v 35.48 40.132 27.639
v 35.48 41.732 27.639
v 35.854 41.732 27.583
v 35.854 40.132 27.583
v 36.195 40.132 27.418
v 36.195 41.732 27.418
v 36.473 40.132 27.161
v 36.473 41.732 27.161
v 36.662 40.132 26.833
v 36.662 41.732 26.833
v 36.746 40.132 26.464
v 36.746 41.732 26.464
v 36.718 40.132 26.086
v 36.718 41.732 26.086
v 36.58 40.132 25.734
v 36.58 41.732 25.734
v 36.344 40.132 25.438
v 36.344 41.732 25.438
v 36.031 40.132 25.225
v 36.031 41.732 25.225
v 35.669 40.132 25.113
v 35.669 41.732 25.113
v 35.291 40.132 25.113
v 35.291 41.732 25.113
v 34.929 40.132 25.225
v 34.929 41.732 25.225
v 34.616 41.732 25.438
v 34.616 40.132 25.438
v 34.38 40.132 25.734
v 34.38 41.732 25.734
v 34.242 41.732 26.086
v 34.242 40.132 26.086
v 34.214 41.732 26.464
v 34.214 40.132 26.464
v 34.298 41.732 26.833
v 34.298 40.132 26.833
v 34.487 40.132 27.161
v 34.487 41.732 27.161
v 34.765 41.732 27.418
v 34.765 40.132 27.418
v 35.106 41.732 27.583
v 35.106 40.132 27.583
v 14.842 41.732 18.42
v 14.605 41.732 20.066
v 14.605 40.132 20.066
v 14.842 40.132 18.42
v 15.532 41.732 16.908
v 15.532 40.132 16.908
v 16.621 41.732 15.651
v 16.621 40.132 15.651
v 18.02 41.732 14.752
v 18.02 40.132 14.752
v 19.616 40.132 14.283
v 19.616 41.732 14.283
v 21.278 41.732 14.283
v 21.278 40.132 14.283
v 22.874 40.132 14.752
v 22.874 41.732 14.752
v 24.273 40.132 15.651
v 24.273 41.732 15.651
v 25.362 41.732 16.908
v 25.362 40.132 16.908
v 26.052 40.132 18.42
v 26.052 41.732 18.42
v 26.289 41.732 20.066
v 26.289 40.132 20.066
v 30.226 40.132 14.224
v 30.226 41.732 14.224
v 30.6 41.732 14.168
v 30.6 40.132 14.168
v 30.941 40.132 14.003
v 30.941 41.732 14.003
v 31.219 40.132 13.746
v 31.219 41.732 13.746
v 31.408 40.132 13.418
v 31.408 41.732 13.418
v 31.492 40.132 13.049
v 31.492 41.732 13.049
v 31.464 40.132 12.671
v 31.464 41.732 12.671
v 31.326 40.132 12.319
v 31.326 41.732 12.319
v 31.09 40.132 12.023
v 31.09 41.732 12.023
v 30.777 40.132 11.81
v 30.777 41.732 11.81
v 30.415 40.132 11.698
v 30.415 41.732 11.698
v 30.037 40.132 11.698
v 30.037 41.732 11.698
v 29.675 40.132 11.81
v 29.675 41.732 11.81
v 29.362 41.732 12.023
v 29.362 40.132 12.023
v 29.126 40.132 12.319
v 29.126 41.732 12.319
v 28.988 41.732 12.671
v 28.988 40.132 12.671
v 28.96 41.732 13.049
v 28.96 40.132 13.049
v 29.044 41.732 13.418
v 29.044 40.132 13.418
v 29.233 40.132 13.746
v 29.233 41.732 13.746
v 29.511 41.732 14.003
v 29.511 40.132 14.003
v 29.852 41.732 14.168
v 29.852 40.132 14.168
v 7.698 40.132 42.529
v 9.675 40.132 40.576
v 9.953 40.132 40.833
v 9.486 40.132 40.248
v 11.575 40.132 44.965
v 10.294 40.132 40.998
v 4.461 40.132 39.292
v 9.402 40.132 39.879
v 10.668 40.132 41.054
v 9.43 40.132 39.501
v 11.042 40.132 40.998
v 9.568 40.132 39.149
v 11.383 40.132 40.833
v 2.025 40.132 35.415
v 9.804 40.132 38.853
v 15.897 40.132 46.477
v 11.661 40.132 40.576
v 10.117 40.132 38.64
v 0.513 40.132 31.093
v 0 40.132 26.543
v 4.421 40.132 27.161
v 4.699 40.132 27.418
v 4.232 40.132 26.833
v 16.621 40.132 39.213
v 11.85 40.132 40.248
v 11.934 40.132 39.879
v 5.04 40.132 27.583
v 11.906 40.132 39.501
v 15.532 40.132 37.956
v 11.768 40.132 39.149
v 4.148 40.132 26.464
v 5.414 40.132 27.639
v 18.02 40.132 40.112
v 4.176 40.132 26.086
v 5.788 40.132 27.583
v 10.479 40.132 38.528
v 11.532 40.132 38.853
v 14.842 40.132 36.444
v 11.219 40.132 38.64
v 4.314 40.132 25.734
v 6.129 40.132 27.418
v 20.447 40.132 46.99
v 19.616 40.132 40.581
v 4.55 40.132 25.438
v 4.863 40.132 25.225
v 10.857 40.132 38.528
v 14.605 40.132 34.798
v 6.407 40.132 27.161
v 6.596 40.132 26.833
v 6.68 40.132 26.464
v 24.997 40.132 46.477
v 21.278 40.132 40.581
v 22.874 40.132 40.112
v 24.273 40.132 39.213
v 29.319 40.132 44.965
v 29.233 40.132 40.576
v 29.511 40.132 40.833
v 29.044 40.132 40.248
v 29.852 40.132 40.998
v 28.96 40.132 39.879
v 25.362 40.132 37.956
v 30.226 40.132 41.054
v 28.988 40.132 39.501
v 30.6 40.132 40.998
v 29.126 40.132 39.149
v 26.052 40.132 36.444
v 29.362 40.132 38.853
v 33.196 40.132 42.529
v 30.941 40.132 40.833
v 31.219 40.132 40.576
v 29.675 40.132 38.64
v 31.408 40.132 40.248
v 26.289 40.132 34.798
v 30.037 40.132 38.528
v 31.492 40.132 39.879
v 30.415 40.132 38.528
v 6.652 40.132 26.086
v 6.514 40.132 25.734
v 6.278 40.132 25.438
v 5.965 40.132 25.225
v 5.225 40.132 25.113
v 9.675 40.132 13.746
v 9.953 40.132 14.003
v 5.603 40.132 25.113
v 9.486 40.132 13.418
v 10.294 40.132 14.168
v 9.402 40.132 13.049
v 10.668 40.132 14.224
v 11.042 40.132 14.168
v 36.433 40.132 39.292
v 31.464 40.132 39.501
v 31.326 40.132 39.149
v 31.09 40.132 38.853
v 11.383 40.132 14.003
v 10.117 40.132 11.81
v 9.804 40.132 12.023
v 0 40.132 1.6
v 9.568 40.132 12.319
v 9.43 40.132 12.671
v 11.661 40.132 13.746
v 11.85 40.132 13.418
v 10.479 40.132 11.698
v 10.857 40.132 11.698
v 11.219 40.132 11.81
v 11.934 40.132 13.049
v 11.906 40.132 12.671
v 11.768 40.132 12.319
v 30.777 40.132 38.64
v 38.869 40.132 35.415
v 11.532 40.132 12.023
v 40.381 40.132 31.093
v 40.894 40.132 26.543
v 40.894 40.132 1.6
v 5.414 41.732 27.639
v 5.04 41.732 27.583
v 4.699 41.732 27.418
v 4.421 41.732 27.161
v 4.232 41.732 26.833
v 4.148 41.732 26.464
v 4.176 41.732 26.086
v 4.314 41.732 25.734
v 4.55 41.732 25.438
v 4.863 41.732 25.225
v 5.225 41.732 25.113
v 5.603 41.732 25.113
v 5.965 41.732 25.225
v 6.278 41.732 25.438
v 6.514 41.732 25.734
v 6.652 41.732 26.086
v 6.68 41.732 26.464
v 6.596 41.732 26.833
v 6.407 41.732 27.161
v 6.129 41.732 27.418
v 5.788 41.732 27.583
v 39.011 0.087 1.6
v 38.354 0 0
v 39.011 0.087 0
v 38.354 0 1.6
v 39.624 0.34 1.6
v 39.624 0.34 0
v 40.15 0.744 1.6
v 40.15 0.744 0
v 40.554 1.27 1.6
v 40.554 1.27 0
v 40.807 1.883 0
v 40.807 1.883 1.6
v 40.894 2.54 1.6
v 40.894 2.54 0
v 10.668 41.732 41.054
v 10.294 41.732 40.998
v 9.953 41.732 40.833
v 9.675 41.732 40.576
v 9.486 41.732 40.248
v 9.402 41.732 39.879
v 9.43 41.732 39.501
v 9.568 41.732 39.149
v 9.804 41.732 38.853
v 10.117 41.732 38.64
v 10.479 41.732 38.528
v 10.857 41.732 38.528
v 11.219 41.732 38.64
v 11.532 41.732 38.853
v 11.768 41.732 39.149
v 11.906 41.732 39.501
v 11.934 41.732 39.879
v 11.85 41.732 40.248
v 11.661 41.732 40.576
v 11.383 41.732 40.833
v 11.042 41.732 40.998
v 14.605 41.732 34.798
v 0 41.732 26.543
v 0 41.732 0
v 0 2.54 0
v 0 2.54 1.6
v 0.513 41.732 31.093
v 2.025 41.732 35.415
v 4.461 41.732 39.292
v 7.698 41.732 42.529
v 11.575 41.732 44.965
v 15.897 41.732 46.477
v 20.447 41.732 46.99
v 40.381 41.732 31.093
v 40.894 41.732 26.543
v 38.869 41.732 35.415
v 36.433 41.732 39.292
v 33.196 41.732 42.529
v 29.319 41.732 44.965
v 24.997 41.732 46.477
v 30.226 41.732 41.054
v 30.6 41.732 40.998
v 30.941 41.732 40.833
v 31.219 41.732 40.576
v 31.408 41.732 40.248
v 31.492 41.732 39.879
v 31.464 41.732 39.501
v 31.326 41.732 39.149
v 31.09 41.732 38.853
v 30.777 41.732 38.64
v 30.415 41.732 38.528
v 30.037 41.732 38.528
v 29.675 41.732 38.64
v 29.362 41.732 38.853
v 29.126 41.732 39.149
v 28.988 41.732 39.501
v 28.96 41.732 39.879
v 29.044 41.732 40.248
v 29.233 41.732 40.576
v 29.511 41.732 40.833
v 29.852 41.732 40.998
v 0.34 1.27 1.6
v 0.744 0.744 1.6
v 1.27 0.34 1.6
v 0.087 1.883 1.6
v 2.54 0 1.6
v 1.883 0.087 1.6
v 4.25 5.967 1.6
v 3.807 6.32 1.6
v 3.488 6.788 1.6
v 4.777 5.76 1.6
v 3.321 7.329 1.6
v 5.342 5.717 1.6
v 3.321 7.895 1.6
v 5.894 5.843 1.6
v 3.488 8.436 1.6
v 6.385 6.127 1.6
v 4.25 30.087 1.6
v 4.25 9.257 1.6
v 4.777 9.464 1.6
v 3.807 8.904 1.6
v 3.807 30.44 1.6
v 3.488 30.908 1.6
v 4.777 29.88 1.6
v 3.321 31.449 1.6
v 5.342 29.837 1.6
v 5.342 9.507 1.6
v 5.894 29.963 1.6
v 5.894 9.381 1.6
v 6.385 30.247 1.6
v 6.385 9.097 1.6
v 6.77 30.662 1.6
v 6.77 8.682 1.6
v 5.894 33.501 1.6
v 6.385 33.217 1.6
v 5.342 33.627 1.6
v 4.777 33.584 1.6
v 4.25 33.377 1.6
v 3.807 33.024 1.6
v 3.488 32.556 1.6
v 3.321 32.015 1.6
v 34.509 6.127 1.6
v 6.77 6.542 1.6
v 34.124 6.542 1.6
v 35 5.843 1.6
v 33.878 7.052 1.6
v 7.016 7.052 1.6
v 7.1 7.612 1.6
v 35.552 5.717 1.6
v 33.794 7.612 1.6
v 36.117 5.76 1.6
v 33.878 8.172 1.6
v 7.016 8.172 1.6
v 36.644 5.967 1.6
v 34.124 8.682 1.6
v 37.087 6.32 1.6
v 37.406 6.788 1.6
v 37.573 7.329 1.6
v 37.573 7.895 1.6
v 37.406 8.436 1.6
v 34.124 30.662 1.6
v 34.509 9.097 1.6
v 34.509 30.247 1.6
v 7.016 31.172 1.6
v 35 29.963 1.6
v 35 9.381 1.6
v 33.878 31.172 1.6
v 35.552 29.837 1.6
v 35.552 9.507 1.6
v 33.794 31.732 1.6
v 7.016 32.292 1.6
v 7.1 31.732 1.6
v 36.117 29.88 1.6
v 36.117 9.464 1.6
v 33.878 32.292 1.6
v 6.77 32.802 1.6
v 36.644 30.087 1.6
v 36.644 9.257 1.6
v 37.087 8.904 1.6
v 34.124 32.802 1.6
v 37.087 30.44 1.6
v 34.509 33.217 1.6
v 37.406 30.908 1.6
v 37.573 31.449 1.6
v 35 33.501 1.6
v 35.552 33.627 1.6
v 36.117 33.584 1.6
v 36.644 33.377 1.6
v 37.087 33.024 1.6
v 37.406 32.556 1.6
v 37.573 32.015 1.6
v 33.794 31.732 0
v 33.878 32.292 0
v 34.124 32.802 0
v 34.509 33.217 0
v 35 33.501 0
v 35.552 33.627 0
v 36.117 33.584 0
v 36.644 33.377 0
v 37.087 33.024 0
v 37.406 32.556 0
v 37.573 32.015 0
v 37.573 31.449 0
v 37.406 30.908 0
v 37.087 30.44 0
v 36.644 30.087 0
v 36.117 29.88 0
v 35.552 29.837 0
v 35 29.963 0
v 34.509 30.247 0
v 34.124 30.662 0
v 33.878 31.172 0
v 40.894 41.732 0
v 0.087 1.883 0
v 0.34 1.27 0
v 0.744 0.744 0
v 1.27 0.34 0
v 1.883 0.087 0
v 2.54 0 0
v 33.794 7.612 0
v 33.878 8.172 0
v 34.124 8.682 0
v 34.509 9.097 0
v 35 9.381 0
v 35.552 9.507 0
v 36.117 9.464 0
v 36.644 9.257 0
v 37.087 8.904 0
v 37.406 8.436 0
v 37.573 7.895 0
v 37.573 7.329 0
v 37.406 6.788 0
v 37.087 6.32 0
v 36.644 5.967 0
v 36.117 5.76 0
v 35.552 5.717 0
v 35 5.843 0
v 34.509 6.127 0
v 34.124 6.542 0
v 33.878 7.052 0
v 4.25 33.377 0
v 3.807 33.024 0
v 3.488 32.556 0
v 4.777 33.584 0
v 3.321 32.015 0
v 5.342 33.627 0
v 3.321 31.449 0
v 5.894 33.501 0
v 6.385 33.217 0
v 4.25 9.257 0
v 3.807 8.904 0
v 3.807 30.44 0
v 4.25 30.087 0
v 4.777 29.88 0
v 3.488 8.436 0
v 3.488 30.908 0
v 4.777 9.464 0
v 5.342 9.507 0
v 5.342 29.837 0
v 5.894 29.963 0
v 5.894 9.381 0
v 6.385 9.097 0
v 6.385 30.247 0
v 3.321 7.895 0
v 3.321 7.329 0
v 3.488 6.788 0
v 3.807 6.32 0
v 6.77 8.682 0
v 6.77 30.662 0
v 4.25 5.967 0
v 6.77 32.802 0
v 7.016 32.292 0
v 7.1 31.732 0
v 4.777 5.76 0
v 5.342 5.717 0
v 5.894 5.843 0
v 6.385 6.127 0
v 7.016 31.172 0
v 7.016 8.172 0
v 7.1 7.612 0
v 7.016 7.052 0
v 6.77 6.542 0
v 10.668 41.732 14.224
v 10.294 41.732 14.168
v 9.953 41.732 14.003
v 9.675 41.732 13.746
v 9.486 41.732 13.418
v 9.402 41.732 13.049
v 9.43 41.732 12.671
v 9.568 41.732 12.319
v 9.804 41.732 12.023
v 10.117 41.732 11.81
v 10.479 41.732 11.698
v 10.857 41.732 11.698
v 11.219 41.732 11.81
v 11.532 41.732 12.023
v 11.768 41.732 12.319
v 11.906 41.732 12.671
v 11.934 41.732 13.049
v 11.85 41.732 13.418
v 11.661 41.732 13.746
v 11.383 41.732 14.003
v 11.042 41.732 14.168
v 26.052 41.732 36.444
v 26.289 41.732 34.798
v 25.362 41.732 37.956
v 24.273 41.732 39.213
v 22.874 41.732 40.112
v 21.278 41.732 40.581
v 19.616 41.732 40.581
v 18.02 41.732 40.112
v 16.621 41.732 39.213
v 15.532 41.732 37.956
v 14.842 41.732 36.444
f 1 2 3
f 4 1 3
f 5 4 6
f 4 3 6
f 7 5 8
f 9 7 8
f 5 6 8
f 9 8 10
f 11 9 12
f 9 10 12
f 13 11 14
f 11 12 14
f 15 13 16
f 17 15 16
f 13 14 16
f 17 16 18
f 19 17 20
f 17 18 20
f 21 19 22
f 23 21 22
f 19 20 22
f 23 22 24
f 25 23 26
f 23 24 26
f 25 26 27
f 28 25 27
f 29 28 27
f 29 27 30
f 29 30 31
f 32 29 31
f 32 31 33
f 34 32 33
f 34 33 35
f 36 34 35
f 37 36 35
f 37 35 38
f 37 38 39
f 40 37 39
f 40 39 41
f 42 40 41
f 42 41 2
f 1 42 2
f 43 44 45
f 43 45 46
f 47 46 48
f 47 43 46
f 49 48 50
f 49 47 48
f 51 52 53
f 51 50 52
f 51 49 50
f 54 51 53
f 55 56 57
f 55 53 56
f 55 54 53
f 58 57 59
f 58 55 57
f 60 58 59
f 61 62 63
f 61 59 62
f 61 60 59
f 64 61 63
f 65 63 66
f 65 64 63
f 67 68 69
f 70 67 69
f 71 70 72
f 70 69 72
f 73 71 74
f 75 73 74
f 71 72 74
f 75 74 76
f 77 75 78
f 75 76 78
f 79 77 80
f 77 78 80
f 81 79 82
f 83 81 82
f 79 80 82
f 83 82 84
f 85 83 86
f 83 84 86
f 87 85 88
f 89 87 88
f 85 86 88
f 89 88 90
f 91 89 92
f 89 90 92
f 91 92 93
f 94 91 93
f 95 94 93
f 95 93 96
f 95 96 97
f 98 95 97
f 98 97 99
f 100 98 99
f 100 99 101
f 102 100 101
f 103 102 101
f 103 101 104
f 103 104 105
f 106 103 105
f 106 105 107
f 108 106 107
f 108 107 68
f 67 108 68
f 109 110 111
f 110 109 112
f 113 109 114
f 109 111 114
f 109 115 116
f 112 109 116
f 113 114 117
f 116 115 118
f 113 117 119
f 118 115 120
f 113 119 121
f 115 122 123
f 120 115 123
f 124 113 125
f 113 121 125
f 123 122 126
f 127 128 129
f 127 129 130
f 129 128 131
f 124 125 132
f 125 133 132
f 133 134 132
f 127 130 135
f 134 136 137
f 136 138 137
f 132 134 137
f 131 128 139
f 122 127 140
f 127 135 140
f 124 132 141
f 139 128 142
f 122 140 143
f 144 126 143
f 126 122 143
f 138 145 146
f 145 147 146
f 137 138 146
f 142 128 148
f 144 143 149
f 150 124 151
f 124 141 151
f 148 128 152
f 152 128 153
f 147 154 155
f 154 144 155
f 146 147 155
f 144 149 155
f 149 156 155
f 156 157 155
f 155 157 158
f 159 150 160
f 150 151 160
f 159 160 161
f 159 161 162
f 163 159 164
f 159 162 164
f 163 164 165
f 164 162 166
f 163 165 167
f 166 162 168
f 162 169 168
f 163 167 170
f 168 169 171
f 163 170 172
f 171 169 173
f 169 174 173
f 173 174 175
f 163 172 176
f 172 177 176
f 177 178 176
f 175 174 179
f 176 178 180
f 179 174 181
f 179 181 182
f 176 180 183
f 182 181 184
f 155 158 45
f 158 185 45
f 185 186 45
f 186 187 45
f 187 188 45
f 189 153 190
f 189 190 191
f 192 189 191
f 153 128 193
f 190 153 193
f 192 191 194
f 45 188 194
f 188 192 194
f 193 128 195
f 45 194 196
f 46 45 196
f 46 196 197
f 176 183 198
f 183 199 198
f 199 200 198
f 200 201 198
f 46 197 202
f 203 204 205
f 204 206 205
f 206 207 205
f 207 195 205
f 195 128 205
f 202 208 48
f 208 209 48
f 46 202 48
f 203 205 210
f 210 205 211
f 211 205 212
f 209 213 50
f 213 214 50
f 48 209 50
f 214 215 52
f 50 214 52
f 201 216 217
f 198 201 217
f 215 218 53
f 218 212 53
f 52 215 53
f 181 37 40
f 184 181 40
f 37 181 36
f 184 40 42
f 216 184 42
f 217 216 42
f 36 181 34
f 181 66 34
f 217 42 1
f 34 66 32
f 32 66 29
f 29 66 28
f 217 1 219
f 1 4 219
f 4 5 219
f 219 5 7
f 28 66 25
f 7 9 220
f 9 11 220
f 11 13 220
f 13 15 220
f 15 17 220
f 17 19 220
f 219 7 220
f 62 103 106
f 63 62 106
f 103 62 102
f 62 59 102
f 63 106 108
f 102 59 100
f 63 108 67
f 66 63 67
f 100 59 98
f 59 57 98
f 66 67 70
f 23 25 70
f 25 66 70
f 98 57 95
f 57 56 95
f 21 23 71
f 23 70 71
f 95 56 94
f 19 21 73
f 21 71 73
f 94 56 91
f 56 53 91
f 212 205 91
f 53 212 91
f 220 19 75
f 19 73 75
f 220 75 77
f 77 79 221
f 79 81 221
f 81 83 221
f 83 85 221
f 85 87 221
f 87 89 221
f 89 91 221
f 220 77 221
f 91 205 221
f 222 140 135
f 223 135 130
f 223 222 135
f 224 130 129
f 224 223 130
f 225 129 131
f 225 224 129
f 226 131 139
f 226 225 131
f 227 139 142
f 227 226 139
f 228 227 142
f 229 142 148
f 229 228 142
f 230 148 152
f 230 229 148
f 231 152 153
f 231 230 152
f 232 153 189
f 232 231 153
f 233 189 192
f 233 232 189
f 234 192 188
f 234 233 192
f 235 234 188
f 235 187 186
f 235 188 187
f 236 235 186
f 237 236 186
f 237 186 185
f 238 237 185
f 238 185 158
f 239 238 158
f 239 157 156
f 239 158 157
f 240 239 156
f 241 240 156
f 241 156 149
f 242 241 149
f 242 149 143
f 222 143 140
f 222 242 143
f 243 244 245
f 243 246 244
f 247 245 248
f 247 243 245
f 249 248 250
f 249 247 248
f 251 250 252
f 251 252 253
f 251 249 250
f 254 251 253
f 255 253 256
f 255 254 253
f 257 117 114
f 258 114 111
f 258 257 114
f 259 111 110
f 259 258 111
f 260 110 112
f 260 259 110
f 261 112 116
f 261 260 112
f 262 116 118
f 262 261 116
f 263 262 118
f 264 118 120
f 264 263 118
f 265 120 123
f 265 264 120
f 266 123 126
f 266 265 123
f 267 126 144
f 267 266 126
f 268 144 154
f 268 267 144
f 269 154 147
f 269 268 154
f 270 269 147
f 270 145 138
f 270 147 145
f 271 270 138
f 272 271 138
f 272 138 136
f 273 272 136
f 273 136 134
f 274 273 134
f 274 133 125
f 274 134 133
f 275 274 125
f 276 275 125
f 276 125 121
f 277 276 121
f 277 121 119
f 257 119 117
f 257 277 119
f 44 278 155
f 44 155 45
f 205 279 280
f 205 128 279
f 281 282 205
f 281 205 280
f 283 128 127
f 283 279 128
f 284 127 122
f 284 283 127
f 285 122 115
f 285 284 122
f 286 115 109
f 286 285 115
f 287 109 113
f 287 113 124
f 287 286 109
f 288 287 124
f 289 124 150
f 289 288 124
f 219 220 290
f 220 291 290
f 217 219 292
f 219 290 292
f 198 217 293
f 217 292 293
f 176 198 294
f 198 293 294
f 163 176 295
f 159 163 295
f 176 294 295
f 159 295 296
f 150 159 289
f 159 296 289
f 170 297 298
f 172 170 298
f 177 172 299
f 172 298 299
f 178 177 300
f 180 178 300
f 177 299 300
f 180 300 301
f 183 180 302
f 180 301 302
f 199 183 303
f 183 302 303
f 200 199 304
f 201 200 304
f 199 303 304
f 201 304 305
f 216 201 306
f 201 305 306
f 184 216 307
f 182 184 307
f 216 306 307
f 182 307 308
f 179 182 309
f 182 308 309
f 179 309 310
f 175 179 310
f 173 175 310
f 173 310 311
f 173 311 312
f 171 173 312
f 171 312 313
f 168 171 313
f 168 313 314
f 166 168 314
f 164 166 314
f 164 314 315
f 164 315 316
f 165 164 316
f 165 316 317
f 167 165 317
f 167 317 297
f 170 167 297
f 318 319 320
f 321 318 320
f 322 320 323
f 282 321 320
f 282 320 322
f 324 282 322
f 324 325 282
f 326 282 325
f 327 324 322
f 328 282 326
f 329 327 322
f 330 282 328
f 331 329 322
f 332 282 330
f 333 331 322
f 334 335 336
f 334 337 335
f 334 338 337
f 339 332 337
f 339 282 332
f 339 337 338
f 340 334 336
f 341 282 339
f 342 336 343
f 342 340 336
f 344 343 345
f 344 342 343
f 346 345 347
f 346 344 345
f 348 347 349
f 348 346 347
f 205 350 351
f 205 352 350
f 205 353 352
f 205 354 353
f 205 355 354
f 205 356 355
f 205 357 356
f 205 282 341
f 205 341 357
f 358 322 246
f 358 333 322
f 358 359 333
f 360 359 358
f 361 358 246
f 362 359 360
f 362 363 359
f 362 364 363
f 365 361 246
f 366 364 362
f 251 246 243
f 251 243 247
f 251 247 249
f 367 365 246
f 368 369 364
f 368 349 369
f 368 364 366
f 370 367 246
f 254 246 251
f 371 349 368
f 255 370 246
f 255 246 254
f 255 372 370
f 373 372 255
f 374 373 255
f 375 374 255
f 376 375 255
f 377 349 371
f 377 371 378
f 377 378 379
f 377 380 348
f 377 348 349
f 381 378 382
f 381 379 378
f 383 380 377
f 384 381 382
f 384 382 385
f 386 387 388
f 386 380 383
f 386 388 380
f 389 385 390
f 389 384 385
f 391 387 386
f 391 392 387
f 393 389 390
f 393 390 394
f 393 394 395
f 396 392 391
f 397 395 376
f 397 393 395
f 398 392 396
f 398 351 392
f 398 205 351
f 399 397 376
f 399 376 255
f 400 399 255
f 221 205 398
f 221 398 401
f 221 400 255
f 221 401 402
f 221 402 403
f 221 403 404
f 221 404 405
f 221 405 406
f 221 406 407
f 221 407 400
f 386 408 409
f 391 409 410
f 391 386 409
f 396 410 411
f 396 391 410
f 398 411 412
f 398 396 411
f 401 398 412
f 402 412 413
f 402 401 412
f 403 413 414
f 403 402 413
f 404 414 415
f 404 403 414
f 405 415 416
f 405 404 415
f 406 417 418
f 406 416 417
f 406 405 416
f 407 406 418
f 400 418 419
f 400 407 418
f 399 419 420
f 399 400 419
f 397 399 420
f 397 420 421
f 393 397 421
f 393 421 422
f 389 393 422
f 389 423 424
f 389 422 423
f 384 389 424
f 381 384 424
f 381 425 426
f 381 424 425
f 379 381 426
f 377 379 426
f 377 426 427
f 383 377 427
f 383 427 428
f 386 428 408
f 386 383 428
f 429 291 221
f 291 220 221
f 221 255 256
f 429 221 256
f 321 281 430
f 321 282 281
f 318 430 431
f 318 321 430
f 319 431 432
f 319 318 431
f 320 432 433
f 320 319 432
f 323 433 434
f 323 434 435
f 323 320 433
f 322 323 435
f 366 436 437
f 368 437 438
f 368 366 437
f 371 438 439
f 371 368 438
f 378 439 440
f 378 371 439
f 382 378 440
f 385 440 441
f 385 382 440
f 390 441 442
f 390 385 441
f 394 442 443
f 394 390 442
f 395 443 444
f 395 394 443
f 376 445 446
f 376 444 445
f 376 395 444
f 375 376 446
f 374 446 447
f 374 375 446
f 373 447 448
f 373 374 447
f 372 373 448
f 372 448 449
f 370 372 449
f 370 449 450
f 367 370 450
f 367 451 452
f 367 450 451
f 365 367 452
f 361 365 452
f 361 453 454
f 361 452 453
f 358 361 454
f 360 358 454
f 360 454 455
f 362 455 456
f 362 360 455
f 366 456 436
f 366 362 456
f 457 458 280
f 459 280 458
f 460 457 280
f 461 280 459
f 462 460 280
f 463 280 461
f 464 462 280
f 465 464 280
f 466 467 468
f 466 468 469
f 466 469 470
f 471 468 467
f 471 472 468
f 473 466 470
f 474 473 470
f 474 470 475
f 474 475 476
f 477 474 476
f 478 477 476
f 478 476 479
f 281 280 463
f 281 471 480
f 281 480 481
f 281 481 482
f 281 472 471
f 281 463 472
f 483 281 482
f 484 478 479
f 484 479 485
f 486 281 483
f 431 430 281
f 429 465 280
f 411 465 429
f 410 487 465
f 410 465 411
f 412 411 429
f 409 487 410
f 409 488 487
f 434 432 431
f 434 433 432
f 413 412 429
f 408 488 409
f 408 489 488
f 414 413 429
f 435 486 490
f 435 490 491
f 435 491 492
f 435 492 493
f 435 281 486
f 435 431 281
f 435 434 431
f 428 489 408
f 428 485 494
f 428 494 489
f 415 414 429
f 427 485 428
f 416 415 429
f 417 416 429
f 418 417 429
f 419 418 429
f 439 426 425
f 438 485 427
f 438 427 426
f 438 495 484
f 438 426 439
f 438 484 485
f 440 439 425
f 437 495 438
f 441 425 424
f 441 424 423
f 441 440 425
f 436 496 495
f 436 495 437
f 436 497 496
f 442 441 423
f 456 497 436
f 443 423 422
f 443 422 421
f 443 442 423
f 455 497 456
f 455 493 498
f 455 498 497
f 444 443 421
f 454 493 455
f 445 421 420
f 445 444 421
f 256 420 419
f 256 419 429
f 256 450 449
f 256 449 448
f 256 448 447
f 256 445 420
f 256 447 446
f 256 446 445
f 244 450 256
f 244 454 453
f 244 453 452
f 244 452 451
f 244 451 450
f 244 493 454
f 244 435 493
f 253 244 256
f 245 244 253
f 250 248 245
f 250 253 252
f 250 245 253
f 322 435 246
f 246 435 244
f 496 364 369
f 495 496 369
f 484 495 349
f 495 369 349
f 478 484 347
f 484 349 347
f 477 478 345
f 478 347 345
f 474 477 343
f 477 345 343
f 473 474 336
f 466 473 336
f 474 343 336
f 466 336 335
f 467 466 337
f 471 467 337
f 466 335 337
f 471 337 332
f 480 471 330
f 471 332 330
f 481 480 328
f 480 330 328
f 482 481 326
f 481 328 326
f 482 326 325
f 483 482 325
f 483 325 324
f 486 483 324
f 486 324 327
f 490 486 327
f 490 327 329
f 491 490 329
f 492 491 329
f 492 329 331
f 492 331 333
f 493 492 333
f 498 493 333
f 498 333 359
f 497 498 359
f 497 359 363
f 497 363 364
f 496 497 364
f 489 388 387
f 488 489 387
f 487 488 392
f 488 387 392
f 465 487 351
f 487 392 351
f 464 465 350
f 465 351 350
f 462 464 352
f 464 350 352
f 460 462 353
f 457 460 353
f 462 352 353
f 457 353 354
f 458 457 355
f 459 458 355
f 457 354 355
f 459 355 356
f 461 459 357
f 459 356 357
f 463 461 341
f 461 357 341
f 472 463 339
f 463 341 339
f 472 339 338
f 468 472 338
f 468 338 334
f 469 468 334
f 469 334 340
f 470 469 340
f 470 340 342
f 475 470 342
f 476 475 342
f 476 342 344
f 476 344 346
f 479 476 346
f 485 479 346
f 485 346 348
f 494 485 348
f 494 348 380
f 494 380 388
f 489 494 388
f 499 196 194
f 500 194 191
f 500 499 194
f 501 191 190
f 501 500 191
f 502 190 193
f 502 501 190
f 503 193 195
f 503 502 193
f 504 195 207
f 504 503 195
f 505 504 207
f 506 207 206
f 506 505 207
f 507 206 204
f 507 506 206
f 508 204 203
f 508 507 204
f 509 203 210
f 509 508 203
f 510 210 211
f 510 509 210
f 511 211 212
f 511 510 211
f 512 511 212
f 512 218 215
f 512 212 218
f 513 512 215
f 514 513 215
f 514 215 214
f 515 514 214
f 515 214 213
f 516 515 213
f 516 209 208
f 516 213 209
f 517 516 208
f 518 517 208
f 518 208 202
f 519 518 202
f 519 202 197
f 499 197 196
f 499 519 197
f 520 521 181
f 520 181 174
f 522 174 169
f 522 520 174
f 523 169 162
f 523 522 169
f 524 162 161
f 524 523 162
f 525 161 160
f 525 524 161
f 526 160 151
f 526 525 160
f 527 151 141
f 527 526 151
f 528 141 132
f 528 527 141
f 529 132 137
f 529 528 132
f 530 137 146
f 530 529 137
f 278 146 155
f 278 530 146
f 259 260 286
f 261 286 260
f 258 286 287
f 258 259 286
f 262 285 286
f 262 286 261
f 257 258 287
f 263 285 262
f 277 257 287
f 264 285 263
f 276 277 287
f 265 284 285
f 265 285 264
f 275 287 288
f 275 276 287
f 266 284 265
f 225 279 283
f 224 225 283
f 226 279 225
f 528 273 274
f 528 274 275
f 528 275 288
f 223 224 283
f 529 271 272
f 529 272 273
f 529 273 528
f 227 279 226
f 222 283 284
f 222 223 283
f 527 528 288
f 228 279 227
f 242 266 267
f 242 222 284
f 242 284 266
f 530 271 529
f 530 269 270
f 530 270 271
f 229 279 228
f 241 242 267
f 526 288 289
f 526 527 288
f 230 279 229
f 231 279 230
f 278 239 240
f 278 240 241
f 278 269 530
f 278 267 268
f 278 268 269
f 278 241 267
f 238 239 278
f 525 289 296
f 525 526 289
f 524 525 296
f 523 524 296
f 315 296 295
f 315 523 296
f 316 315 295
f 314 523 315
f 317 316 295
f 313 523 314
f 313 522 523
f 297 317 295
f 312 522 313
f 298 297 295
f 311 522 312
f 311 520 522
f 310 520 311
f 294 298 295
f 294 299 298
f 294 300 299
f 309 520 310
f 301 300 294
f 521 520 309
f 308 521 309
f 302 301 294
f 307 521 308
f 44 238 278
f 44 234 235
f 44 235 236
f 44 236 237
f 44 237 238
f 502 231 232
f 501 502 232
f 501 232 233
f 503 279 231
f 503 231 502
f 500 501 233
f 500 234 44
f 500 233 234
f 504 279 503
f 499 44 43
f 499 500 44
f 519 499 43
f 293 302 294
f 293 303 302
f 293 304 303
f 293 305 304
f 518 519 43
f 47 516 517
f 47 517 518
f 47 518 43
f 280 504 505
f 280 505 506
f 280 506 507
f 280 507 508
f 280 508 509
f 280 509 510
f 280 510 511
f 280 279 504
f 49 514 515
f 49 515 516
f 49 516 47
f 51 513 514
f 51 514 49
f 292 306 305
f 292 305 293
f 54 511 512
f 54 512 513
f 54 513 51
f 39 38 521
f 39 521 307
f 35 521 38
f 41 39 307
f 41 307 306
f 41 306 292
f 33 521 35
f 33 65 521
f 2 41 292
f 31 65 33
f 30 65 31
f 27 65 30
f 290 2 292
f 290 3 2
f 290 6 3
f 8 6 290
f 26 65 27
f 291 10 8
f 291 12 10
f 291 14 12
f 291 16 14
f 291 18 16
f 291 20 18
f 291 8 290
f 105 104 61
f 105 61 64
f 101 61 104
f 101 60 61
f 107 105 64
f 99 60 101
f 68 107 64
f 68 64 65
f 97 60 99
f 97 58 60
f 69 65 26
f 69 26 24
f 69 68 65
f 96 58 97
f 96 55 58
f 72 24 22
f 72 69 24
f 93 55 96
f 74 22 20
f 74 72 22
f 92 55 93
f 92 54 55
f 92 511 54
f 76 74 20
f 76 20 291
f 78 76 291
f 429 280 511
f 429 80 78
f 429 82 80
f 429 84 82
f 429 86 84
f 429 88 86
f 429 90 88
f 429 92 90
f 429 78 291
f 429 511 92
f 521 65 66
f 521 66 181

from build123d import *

# Parameters (mm, degrees)
SKETCH1_W           = 40.894
SKETCH1_H           = 40.132
BOSS_EXTRUDE1_DEPTH = 1.600000102
SKETCH2_R           = 1.90000001
CUT_EXTRUDE1_DEPTH  = 58.318903168
SKETCH2_3_R         = 1.90000001
CUT_EXTRUDE2_DEPTH  = 58.318903168
FILLET1_R           = 2.54
SKETCH5_W           = 40.894
SKETCH5_H           = 46.99
BOSS_EXTRUDE2_DEPTH = 1.600000102
FILLET2_R           = 20.447
SKETCH6_R           = 1.27
CUT_EXTRUDE3_DEPTH  = 75.97959168
CUT_EXTRUDE4_DEPTH  = 75.97959168


with BuildPart() as part:
    # Sketch1 → Boss-Extrude1 (new body)
    with BuildSketch(Plane.XY):
        with Locations((20.447, 20.066)):
            Rectangle(SKETCH1_W, SKETCH1_H)
    extrude(amount=BOSS_EXTRUDE1_DEPTH)

    # Sketch2 → Cut-Extrude1 (cut, through all)
    with BuildSketch(Plane.XY.offset(1.600000102)):
        with Locations((5.200000014, 7.612000016)):
            Circle(SKETCH2_R)
    cut_extrude1 = extrude(amount=-CUT_EXTRUDE1_DEPTH, mode=Mode.SUBTRACT)

    # Sketch2<3> → Cut-Extrude2 (cut, through all)
    with BuildSketch(Plane.XY.offset(1.600000102)):
        with Locations((5.200000014, 31.732000036)):
            Circle(SKETCH2_3_R)
        with Locations((5.200000014, 7.612000016)):
            Circle(SKETCH2_3_R)
    cut_extrude2 = extrude(amount=-CUT_EXTRUDE2_DEPTH, mode=Mode.SUBTRACT)

    # Mirror2: Cut-Extrude1, Cut-Extrude2 across plane
    add(cut_extrude1.mirror(Plane.ZY.offset(-20.447)), mode=Mode.SUBTRACT)
    add(cut_extrude2.mirror(Plane.ZY.offset(-20.447)), mode=Mode.SUBTRACT)

    # Fillet1
    fillet1_edges = [part.edges().sort_by_distance(p)[0] for p in [
        (40.894, 0, 0.800000051),
        (0, 0, 0.800000051),
    ]]
    fillet(fillet1_edges, radius=FILLET1_R)

    # Sketch5 → Boss-Extrude2 (add)
    with BuildSketch(Plane(origin=(0, 40.132, 0), x_dir=(1, 0, 0), z_dir=(0, 1, 0))):
        with Locations((20.447, -23.495)):
            Rectangle(SKETCH5_W, SKETCH5_H)
    extrude(amount=BOSS_EXTRUDE2_DEPTH)

    # Fillet2
    fillet2_edges = [part.edges().sort_by_distance(p)[0] for p in [
        (0, 40.932000051, 46.99),
        (40.894, 40.932000051, 46.99),
    ]]
    fillet(fillet2_edges, radius=FILLET2_R - 0.0001)  # a hair under: the kernel refuses the full size

    # Sketch6 → Cut-Extrude3 (cut, through all)
    with BuildSketch(Plane(origin=(0, 41.732000102, 0), x_dir=(1, 0, 0), z_dir=(0, 1, 0))):
        with Locations(Location((30.226, -39.783999934, 0), (0, 0, 270))):
            Circle(SKETCH6_R)
        with Locations(Location((30.226, -12.954, 0), (0, 0, 270))):
            Circle(SKETCH6_R)
        with Locations(Location((35.480000033, -26.368999967, 0), (0, 0, 270))):
            Circle(SKETCH6_R)
    cut_extrude3 = extrude(amount=-CUT_EXTRUDE3_DEPTH, mode=Mode.SUBTRACT)

    # Mirror3: Cut-Extrude3 across plane
    add(cut_extrude3.mirror(Plane.ZY.offset(-20.447)), mode=Mode.SUBTRACT)

    # Sketch7 → Cut-Extrude4 (cut, through all)
    with BuildSketch(Plane(origin=(0, 41.732000102, 0), x_dir=(1, 0, 0), z_dir=(0, 1, 0))):
        with BuildLine():
            Line((14.605, -34.798), (14.605, -20.066))
            ThreePointArc((14.605, -20.066), (20.447, -14.224), (26.289, -20.066))
            Line((26.289, -20.066), (26.289, -34.798))
            ThreePointArc((26.289, -34.798), (20.447, -40.64), (14.605, -34.798))
        make_face()
    extrude(amount=-CUT_EXTRUDE4_DEPTH, mode=Mode.SUBTRACT)


solid = part.part
